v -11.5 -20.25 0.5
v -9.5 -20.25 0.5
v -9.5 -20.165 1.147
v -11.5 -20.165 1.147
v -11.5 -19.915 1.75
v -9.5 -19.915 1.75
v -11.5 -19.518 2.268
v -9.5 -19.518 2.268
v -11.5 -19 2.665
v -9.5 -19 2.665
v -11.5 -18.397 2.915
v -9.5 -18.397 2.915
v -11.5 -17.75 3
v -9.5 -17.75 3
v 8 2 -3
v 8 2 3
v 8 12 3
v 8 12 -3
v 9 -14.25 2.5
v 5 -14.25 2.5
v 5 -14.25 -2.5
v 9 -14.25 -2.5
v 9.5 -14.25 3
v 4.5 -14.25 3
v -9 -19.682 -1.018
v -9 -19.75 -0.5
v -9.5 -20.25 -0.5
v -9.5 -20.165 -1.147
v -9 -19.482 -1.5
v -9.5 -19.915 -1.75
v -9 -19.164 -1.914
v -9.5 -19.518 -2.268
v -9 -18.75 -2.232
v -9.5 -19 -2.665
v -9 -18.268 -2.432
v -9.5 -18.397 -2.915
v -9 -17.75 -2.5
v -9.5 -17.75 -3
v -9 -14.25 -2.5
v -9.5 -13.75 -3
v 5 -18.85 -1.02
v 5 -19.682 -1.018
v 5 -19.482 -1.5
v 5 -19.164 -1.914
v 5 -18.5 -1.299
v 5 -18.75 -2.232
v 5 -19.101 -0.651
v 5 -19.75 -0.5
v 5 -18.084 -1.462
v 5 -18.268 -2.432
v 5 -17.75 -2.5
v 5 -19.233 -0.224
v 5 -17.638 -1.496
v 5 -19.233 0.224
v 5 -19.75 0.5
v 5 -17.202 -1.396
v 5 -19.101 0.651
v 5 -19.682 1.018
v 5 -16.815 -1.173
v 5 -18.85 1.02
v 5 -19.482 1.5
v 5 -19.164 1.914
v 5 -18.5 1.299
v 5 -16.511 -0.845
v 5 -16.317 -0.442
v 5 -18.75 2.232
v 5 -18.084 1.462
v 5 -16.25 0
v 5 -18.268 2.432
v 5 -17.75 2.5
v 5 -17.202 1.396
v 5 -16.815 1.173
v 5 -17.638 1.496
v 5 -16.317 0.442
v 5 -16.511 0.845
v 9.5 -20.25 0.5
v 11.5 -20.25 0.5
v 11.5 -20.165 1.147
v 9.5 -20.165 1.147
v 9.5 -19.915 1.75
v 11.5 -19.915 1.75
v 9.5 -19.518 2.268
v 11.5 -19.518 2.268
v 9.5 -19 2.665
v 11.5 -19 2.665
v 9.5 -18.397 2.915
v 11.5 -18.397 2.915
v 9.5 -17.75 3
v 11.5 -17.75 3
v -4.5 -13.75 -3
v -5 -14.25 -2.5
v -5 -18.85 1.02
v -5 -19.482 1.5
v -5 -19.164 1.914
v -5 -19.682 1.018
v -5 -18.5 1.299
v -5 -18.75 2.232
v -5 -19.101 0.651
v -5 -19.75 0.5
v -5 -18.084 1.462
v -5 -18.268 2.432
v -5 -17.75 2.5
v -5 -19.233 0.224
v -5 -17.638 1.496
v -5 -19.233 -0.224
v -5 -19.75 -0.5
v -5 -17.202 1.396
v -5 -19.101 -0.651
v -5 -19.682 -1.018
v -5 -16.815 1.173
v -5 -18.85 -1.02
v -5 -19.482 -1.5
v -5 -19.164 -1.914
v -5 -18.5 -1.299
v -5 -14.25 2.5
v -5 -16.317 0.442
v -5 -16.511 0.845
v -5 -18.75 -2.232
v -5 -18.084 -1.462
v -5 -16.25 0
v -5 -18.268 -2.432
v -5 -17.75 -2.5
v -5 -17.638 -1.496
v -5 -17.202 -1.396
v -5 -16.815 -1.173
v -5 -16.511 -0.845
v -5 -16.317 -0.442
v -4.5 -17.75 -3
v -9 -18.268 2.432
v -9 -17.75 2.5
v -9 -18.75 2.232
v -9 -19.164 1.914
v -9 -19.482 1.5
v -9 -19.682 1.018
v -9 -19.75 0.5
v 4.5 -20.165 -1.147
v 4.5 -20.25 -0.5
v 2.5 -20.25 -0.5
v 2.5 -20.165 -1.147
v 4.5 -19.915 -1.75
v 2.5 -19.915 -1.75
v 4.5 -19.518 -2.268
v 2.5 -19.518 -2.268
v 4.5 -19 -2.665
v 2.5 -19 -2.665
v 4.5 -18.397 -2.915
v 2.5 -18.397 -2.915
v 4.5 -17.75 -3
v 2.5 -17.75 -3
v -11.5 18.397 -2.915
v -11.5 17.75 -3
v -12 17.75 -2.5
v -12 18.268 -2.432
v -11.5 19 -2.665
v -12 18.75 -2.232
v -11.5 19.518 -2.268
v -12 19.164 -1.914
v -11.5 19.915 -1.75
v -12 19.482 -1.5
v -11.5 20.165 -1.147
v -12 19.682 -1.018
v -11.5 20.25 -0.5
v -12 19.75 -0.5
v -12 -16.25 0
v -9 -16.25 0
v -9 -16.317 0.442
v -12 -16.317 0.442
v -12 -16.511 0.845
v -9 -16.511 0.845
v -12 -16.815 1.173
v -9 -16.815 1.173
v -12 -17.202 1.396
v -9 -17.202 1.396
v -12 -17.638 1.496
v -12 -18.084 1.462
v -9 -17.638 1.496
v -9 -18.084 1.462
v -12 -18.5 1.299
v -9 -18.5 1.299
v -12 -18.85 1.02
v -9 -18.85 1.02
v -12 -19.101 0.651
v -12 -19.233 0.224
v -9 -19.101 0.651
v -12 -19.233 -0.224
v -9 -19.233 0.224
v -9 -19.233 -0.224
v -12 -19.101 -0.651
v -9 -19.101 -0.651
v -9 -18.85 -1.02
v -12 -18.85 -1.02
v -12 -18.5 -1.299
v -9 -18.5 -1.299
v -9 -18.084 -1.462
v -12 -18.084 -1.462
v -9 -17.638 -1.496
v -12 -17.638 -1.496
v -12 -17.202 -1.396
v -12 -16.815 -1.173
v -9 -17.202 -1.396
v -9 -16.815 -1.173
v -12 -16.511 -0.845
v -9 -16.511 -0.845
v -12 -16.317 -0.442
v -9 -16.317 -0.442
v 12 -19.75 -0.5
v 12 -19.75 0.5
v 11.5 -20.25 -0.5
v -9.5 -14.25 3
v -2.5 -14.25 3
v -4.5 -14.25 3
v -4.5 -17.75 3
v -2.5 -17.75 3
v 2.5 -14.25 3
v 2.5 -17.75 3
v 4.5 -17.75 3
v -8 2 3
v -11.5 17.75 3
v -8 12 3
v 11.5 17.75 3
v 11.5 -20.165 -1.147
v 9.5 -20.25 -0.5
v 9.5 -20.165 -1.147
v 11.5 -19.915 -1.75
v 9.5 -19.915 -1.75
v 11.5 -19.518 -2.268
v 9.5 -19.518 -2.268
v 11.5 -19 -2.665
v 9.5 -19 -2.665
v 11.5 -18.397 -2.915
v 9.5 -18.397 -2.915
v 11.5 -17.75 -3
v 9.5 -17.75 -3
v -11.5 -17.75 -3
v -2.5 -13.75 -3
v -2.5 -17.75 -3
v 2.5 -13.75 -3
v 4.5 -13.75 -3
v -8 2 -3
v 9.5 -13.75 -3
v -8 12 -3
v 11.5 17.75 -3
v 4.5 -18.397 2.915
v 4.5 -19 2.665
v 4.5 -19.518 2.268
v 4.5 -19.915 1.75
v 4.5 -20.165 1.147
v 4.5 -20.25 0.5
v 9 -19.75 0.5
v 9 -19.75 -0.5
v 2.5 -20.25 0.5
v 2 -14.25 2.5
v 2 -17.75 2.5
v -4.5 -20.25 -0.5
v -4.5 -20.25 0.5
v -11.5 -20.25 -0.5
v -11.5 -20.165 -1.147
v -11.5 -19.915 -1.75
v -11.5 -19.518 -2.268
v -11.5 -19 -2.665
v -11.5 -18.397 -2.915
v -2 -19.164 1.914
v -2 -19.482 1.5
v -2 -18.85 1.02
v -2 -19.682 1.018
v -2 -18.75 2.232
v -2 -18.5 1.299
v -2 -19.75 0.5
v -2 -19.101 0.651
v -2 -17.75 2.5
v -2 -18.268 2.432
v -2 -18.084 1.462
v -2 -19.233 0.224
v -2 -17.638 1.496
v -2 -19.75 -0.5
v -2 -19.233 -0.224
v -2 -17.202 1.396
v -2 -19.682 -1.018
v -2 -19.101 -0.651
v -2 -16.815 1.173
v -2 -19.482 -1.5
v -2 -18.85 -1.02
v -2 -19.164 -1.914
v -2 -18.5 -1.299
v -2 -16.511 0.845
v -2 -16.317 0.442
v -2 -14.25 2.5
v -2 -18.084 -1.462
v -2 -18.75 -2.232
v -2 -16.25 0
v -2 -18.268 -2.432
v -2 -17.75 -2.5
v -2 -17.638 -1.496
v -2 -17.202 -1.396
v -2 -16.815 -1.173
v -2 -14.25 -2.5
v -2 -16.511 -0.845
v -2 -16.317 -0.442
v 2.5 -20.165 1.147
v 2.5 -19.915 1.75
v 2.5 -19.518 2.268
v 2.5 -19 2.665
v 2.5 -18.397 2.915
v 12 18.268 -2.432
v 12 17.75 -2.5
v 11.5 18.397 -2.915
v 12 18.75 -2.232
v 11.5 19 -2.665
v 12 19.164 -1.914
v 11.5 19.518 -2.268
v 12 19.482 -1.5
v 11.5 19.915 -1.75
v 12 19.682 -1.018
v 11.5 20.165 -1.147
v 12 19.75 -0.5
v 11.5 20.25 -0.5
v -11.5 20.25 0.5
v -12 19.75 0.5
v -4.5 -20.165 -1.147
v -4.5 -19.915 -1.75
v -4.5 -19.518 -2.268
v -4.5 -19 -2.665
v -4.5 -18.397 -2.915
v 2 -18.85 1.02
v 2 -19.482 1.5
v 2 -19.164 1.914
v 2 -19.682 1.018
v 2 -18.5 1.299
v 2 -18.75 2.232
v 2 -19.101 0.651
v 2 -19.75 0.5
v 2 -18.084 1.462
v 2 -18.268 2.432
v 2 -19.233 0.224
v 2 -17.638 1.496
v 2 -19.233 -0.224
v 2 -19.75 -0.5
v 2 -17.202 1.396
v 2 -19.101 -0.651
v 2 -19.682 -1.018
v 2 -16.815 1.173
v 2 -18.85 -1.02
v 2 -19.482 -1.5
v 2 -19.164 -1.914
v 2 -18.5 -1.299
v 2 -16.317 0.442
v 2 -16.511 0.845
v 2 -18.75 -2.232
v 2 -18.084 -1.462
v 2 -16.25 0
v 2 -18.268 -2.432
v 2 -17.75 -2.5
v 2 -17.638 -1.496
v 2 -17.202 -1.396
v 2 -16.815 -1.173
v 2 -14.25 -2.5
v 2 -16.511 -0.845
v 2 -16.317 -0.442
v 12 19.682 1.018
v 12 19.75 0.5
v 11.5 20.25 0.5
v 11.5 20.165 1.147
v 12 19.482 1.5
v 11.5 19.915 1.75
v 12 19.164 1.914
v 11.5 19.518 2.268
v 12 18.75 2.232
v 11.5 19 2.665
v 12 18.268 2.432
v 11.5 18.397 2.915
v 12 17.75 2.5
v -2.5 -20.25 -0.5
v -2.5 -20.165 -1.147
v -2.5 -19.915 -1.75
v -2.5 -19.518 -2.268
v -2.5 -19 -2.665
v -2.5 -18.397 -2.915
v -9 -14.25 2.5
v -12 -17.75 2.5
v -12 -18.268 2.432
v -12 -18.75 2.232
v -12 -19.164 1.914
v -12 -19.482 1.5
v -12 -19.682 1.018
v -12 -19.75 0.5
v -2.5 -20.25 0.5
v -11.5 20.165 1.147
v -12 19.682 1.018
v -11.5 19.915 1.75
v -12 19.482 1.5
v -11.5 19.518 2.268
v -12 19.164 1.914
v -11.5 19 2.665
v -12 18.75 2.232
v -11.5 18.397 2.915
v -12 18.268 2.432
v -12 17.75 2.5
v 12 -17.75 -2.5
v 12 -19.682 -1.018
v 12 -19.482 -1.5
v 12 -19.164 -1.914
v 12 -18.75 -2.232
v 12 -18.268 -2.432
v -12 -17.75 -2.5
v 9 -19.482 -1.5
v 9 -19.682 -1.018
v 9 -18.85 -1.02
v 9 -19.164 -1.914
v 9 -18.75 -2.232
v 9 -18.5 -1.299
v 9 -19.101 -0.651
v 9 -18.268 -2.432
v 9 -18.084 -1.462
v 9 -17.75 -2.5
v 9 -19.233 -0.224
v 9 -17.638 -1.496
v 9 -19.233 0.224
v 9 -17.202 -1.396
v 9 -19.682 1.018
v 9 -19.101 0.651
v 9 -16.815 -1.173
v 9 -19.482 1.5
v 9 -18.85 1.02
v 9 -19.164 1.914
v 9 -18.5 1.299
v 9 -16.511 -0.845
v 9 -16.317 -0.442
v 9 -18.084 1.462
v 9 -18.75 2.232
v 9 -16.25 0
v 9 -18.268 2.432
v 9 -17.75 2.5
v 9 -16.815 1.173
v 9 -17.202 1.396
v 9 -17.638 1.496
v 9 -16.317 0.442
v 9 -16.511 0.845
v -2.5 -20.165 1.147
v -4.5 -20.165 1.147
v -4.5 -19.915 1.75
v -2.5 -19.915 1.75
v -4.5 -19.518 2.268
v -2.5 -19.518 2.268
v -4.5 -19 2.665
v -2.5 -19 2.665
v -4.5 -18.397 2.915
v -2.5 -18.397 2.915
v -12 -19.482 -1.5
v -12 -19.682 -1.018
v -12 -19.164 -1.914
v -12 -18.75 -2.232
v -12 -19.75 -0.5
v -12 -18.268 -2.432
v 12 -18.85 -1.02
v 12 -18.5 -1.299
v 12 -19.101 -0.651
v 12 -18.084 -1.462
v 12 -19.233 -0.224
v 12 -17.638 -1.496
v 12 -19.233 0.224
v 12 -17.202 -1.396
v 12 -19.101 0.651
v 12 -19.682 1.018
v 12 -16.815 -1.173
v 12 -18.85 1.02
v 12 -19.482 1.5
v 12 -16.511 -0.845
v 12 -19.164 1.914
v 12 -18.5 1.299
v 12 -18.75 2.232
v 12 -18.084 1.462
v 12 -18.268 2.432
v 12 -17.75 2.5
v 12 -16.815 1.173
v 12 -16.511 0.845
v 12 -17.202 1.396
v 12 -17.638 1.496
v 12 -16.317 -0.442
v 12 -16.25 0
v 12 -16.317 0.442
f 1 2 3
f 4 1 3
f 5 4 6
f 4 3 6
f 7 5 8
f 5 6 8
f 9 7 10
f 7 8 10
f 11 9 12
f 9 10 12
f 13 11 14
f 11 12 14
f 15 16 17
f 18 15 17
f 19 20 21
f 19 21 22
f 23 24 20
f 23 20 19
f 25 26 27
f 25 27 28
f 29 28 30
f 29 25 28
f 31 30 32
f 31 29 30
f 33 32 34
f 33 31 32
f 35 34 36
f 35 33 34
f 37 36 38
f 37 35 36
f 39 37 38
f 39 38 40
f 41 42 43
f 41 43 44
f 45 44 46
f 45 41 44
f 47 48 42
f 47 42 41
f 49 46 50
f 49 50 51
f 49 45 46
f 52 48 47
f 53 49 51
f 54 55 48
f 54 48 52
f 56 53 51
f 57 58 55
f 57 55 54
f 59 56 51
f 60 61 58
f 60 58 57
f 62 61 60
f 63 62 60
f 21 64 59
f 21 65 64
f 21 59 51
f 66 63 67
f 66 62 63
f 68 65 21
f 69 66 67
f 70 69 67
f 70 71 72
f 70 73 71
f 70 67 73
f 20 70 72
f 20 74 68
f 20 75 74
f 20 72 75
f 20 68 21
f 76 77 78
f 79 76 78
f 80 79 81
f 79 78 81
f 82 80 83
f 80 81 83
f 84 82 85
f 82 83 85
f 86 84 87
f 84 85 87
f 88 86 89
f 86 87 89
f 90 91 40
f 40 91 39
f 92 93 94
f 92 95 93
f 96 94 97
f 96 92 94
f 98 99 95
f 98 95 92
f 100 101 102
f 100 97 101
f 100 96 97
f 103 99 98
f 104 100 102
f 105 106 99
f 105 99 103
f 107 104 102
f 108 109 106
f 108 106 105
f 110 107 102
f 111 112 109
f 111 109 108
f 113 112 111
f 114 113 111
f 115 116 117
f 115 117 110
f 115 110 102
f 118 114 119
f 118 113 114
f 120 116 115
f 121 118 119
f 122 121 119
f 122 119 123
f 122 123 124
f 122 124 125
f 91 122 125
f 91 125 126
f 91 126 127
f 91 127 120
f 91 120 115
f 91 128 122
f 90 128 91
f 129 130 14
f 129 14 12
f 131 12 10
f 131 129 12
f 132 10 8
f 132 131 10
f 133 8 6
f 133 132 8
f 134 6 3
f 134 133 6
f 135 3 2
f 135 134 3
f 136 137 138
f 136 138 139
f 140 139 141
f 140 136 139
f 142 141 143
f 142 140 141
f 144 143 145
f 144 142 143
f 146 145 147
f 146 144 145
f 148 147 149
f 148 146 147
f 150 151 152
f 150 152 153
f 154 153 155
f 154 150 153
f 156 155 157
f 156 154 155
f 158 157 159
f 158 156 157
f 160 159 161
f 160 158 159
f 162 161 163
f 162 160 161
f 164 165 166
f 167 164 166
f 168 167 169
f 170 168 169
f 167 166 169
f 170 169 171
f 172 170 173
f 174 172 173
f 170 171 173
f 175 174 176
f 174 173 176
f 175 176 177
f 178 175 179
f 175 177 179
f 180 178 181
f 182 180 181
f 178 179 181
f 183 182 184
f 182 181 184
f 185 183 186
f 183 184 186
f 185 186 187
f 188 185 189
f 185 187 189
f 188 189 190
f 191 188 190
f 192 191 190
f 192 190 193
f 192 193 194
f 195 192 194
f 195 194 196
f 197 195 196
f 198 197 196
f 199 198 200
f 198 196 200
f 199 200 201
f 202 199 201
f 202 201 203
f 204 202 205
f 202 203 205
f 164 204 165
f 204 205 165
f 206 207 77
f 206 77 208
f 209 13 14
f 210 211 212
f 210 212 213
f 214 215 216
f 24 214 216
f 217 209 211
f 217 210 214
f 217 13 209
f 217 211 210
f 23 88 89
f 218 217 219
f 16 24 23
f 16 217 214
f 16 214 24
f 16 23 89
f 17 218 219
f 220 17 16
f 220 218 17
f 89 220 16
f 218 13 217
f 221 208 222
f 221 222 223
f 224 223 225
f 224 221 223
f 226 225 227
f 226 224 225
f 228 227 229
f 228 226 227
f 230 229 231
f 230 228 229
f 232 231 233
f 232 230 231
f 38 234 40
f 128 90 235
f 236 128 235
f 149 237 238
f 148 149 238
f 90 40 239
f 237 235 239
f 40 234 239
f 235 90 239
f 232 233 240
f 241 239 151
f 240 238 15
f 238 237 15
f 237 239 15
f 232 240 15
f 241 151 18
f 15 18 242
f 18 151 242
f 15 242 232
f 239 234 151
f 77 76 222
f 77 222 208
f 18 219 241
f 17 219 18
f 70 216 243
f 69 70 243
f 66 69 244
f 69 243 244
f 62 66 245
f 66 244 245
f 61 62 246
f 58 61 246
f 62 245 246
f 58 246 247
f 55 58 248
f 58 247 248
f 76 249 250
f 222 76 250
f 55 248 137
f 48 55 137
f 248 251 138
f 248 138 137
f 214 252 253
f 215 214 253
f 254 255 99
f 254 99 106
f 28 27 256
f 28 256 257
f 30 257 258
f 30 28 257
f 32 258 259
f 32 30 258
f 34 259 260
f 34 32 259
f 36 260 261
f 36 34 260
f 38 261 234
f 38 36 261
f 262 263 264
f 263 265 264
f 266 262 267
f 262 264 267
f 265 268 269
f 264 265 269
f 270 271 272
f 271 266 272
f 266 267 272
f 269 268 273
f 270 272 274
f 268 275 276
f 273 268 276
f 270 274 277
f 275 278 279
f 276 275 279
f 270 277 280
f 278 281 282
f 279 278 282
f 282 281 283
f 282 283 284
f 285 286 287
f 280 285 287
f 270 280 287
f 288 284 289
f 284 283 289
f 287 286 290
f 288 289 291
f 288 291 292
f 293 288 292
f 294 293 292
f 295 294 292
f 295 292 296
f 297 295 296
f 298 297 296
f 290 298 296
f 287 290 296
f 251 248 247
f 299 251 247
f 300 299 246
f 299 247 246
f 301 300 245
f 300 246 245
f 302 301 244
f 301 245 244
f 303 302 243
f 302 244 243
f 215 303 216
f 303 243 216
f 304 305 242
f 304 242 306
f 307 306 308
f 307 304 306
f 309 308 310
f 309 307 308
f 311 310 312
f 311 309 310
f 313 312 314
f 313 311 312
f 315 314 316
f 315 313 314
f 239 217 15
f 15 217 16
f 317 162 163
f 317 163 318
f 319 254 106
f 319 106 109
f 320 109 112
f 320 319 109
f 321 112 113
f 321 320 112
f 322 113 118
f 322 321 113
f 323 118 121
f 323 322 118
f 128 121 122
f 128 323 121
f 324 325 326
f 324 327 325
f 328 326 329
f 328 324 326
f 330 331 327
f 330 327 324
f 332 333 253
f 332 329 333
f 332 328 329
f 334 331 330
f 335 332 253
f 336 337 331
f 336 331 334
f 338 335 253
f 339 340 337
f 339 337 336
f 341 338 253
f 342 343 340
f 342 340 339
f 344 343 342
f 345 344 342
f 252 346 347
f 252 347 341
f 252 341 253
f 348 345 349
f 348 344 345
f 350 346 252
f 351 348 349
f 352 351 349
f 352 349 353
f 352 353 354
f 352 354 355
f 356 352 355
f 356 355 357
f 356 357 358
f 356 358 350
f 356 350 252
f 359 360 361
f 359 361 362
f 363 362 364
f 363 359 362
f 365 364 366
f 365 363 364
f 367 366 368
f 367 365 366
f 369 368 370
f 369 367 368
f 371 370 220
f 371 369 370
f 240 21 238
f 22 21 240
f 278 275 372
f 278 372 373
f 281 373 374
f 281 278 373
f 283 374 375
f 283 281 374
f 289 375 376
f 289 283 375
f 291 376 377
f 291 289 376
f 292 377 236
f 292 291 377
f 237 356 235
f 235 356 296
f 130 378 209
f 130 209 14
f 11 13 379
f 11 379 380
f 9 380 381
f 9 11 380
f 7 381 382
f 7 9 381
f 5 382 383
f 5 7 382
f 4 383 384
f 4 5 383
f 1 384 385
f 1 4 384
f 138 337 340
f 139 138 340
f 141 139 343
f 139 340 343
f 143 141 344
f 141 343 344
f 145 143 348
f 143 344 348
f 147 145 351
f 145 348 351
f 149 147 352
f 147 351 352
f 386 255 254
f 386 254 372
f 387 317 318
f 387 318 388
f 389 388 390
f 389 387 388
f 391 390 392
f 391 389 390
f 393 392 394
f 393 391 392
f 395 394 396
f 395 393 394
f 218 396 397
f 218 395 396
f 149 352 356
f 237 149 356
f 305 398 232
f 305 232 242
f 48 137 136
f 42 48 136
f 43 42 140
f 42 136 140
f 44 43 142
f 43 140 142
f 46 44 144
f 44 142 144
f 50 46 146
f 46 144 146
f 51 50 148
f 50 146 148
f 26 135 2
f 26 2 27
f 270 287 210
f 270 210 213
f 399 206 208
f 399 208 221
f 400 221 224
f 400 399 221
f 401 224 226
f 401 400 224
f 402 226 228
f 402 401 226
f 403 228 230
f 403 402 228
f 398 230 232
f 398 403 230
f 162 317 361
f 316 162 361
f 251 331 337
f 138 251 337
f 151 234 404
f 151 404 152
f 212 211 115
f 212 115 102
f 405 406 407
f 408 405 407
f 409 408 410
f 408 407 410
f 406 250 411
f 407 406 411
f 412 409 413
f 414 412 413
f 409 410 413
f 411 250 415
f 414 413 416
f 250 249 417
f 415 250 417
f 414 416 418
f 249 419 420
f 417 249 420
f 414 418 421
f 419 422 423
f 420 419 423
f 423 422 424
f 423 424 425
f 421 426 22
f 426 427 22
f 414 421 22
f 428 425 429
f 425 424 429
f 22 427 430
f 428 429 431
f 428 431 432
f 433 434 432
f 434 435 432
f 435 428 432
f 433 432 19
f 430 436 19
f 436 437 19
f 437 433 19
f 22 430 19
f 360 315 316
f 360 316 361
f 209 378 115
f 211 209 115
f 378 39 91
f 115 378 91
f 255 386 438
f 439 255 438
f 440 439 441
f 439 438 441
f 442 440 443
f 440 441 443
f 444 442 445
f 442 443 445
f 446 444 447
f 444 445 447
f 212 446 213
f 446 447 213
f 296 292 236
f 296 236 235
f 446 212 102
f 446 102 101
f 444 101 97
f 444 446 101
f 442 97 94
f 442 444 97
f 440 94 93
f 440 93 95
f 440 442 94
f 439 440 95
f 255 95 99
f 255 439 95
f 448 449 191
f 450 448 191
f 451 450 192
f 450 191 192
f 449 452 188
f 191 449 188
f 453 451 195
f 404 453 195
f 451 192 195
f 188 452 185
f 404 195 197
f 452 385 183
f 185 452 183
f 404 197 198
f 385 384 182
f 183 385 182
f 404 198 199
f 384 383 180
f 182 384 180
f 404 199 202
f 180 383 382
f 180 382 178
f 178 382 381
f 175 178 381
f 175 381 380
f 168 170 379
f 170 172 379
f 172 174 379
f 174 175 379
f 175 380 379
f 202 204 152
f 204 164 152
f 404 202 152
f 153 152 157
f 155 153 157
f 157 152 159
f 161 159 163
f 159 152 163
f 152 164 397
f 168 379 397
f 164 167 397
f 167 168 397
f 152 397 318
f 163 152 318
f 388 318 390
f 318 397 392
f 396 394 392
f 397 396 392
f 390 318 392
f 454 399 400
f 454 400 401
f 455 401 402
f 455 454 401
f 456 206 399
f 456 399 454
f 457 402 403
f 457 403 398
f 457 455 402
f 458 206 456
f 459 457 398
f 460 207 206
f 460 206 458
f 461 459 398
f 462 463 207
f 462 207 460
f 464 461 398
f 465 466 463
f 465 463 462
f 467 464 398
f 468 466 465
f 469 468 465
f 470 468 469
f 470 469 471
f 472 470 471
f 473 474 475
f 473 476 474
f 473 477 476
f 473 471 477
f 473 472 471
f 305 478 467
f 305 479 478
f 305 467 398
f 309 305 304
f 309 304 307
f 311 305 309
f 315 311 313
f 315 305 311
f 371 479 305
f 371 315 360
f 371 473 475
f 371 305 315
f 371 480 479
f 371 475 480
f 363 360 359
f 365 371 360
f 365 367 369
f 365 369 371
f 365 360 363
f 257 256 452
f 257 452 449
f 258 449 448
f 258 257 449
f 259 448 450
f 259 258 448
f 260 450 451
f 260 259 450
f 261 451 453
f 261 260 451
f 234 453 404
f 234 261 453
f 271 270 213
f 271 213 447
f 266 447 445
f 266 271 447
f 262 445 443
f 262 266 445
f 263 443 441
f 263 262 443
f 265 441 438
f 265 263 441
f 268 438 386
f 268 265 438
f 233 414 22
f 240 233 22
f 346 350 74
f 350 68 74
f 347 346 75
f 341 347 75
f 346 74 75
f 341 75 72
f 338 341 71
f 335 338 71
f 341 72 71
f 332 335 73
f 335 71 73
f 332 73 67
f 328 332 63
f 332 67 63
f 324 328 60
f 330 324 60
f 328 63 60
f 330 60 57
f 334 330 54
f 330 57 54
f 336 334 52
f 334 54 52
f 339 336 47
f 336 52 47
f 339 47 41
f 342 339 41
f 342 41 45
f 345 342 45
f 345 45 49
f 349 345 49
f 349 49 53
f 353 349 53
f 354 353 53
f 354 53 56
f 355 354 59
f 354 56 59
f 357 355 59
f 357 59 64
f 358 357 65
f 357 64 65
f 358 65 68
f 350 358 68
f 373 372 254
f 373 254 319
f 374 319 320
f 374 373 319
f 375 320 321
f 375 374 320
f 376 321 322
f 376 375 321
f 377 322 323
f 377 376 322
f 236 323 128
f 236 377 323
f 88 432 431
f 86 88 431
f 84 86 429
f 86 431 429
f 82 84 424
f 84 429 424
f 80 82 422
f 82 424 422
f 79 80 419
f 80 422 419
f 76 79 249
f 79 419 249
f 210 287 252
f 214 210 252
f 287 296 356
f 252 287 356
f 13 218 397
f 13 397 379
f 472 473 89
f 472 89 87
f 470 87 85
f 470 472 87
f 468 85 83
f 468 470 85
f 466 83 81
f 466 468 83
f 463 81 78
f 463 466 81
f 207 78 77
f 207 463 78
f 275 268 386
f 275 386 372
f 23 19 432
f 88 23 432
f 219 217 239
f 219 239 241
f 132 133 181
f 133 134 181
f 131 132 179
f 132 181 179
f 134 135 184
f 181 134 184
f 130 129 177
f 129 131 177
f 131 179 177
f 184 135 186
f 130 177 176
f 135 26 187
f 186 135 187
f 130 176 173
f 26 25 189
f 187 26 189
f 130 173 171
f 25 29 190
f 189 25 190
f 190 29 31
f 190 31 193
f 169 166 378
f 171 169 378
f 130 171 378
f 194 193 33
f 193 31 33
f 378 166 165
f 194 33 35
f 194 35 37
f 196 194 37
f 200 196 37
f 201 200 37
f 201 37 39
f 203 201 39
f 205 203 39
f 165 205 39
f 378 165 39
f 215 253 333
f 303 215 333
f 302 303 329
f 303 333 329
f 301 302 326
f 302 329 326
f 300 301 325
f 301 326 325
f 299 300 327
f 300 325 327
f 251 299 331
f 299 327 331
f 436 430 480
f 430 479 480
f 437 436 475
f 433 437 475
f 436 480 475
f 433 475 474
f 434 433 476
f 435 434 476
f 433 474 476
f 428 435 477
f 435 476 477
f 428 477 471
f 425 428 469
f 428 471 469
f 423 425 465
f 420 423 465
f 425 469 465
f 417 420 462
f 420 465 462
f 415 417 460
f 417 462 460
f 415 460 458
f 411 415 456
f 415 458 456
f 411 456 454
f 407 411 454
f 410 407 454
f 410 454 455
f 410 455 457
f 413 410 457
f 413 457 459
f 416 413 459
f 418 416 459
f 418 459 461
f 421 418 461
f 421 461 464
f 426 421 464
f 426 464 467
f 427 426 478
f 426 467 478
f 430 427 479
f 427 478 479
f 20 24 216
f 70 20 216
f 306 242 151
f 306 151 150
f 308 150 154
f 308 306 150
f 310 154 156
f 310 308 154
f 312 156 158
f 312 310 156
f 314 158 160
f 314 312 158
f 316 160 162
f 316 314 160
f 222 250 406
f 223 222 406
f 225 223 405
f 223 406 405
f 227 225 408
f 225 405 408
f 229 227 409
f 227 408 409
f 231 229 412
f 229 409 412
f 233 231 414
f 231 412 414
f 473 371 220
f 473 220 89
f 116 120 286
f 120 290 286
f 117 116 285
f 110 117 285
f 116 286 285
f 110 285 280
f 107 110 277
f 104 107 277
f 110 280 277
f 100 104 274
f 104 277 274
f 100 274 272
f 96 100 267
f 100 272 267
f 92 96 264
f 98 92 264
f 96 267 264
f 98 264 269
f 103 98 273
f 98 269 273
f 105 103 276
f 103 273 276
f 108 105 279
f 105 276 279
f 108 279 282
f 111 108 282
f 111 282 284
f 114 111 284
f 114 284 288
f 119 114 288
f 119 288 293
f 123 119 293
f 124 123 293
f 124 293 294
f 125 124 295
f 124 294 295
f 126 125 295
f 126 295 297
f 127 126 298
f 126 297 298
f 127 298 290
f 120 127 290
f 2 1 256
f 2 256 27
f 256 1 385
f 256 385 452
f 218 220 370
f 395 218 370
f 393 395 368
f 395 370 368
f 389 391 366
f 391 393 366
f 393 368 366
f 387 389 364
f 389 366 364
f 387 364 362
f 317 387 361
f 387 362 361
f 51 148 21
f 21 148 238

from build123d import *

# Parameters (mm, degrees)
F0_W     = 24
F0_H     = 40.5
F1_DEPTH = 3
F2_R     = 1.5
F3_DEPTH = 25
F4_R     = 2.5
F5_W     = 4
F5_H     = 6
F6_DEPTH = 12.5
F7_W     = 16
F7_H     = 10
F8_DEPTH = 12.5
F9_SIZE  = 0.5


with BuildPart() as f1:
    # F0 (on Top) → F1 (new body, symmetric)
    with BuildSketch(Plane.XY):
        Rectangle(F0_W, F0_H)
    extrude(amount=F1_DEPTH, both=True)

    # F2 (on Right) → F3 (cut, symmetric)
    with BuildSketch(Plane.YZ):
        with Locations((-17.75, 0)):
            Circle(F2_R)
    extrude(amount=F3_DEPTH, both=True, mode=Mode.SUBTRACT)

    # F4
    f4_edges = [f1.edges().sort_by_distance(p)[0] for p in [
        (0, -20.25, 3),
        (0, -20.25, -3),
        (0, 20.25, 3),
        (0, 20.25, -3),
    ]]
    fillet(f4_edges, radius=F4_R)

    # F5 (on Top) → F6 (cut, symmetric)
    with BuildSketch(Plane.XY):
        with Locations((0, -17.25)):
            Rectangle(F5_W, F5_H)
        with Locations((-7, -17.25)):
            Rectangle(F5_W, F5_H)
        with Locations((7, -17.25)):
            Rectangle(F5_W, F5_H)
    extrude(amount=F6_DEPTH, both=True, mode=Mode.SUBTRACT)

    # F7 (on Top) → F8 (cut, symmetric)
    with BuildSketch(Plane.XY):
        with Locations((0, 7)):
            Rectangle(F7_W, F7_H)
    extrude(amount=F8_DEPTH, both=True, mode=Mode.SUBTRACT)

    # F9
    f9_edges = [f1.edges().sort_by_distance(p)[0] for p in [
        (12, 0, -3),
        (9, -19.517767, -2.267767),
        (5, -19.517767, -2.267767),
        (2, -19.517767, -2.267767),
        (-2, -19.517767, -2.267767),
        (-7, -14.25, -3),
        (-5, -19.517767, -2.267767),
        (-9, -19.517767, -2.267767),
        (-12, -19.517767, -2.267767),
        (0, -14.25, -3),
        (7, -14.25, -3),
    ]]
    chamfer(f9_edges, length=F9_SIZE)


solid = f1.part
